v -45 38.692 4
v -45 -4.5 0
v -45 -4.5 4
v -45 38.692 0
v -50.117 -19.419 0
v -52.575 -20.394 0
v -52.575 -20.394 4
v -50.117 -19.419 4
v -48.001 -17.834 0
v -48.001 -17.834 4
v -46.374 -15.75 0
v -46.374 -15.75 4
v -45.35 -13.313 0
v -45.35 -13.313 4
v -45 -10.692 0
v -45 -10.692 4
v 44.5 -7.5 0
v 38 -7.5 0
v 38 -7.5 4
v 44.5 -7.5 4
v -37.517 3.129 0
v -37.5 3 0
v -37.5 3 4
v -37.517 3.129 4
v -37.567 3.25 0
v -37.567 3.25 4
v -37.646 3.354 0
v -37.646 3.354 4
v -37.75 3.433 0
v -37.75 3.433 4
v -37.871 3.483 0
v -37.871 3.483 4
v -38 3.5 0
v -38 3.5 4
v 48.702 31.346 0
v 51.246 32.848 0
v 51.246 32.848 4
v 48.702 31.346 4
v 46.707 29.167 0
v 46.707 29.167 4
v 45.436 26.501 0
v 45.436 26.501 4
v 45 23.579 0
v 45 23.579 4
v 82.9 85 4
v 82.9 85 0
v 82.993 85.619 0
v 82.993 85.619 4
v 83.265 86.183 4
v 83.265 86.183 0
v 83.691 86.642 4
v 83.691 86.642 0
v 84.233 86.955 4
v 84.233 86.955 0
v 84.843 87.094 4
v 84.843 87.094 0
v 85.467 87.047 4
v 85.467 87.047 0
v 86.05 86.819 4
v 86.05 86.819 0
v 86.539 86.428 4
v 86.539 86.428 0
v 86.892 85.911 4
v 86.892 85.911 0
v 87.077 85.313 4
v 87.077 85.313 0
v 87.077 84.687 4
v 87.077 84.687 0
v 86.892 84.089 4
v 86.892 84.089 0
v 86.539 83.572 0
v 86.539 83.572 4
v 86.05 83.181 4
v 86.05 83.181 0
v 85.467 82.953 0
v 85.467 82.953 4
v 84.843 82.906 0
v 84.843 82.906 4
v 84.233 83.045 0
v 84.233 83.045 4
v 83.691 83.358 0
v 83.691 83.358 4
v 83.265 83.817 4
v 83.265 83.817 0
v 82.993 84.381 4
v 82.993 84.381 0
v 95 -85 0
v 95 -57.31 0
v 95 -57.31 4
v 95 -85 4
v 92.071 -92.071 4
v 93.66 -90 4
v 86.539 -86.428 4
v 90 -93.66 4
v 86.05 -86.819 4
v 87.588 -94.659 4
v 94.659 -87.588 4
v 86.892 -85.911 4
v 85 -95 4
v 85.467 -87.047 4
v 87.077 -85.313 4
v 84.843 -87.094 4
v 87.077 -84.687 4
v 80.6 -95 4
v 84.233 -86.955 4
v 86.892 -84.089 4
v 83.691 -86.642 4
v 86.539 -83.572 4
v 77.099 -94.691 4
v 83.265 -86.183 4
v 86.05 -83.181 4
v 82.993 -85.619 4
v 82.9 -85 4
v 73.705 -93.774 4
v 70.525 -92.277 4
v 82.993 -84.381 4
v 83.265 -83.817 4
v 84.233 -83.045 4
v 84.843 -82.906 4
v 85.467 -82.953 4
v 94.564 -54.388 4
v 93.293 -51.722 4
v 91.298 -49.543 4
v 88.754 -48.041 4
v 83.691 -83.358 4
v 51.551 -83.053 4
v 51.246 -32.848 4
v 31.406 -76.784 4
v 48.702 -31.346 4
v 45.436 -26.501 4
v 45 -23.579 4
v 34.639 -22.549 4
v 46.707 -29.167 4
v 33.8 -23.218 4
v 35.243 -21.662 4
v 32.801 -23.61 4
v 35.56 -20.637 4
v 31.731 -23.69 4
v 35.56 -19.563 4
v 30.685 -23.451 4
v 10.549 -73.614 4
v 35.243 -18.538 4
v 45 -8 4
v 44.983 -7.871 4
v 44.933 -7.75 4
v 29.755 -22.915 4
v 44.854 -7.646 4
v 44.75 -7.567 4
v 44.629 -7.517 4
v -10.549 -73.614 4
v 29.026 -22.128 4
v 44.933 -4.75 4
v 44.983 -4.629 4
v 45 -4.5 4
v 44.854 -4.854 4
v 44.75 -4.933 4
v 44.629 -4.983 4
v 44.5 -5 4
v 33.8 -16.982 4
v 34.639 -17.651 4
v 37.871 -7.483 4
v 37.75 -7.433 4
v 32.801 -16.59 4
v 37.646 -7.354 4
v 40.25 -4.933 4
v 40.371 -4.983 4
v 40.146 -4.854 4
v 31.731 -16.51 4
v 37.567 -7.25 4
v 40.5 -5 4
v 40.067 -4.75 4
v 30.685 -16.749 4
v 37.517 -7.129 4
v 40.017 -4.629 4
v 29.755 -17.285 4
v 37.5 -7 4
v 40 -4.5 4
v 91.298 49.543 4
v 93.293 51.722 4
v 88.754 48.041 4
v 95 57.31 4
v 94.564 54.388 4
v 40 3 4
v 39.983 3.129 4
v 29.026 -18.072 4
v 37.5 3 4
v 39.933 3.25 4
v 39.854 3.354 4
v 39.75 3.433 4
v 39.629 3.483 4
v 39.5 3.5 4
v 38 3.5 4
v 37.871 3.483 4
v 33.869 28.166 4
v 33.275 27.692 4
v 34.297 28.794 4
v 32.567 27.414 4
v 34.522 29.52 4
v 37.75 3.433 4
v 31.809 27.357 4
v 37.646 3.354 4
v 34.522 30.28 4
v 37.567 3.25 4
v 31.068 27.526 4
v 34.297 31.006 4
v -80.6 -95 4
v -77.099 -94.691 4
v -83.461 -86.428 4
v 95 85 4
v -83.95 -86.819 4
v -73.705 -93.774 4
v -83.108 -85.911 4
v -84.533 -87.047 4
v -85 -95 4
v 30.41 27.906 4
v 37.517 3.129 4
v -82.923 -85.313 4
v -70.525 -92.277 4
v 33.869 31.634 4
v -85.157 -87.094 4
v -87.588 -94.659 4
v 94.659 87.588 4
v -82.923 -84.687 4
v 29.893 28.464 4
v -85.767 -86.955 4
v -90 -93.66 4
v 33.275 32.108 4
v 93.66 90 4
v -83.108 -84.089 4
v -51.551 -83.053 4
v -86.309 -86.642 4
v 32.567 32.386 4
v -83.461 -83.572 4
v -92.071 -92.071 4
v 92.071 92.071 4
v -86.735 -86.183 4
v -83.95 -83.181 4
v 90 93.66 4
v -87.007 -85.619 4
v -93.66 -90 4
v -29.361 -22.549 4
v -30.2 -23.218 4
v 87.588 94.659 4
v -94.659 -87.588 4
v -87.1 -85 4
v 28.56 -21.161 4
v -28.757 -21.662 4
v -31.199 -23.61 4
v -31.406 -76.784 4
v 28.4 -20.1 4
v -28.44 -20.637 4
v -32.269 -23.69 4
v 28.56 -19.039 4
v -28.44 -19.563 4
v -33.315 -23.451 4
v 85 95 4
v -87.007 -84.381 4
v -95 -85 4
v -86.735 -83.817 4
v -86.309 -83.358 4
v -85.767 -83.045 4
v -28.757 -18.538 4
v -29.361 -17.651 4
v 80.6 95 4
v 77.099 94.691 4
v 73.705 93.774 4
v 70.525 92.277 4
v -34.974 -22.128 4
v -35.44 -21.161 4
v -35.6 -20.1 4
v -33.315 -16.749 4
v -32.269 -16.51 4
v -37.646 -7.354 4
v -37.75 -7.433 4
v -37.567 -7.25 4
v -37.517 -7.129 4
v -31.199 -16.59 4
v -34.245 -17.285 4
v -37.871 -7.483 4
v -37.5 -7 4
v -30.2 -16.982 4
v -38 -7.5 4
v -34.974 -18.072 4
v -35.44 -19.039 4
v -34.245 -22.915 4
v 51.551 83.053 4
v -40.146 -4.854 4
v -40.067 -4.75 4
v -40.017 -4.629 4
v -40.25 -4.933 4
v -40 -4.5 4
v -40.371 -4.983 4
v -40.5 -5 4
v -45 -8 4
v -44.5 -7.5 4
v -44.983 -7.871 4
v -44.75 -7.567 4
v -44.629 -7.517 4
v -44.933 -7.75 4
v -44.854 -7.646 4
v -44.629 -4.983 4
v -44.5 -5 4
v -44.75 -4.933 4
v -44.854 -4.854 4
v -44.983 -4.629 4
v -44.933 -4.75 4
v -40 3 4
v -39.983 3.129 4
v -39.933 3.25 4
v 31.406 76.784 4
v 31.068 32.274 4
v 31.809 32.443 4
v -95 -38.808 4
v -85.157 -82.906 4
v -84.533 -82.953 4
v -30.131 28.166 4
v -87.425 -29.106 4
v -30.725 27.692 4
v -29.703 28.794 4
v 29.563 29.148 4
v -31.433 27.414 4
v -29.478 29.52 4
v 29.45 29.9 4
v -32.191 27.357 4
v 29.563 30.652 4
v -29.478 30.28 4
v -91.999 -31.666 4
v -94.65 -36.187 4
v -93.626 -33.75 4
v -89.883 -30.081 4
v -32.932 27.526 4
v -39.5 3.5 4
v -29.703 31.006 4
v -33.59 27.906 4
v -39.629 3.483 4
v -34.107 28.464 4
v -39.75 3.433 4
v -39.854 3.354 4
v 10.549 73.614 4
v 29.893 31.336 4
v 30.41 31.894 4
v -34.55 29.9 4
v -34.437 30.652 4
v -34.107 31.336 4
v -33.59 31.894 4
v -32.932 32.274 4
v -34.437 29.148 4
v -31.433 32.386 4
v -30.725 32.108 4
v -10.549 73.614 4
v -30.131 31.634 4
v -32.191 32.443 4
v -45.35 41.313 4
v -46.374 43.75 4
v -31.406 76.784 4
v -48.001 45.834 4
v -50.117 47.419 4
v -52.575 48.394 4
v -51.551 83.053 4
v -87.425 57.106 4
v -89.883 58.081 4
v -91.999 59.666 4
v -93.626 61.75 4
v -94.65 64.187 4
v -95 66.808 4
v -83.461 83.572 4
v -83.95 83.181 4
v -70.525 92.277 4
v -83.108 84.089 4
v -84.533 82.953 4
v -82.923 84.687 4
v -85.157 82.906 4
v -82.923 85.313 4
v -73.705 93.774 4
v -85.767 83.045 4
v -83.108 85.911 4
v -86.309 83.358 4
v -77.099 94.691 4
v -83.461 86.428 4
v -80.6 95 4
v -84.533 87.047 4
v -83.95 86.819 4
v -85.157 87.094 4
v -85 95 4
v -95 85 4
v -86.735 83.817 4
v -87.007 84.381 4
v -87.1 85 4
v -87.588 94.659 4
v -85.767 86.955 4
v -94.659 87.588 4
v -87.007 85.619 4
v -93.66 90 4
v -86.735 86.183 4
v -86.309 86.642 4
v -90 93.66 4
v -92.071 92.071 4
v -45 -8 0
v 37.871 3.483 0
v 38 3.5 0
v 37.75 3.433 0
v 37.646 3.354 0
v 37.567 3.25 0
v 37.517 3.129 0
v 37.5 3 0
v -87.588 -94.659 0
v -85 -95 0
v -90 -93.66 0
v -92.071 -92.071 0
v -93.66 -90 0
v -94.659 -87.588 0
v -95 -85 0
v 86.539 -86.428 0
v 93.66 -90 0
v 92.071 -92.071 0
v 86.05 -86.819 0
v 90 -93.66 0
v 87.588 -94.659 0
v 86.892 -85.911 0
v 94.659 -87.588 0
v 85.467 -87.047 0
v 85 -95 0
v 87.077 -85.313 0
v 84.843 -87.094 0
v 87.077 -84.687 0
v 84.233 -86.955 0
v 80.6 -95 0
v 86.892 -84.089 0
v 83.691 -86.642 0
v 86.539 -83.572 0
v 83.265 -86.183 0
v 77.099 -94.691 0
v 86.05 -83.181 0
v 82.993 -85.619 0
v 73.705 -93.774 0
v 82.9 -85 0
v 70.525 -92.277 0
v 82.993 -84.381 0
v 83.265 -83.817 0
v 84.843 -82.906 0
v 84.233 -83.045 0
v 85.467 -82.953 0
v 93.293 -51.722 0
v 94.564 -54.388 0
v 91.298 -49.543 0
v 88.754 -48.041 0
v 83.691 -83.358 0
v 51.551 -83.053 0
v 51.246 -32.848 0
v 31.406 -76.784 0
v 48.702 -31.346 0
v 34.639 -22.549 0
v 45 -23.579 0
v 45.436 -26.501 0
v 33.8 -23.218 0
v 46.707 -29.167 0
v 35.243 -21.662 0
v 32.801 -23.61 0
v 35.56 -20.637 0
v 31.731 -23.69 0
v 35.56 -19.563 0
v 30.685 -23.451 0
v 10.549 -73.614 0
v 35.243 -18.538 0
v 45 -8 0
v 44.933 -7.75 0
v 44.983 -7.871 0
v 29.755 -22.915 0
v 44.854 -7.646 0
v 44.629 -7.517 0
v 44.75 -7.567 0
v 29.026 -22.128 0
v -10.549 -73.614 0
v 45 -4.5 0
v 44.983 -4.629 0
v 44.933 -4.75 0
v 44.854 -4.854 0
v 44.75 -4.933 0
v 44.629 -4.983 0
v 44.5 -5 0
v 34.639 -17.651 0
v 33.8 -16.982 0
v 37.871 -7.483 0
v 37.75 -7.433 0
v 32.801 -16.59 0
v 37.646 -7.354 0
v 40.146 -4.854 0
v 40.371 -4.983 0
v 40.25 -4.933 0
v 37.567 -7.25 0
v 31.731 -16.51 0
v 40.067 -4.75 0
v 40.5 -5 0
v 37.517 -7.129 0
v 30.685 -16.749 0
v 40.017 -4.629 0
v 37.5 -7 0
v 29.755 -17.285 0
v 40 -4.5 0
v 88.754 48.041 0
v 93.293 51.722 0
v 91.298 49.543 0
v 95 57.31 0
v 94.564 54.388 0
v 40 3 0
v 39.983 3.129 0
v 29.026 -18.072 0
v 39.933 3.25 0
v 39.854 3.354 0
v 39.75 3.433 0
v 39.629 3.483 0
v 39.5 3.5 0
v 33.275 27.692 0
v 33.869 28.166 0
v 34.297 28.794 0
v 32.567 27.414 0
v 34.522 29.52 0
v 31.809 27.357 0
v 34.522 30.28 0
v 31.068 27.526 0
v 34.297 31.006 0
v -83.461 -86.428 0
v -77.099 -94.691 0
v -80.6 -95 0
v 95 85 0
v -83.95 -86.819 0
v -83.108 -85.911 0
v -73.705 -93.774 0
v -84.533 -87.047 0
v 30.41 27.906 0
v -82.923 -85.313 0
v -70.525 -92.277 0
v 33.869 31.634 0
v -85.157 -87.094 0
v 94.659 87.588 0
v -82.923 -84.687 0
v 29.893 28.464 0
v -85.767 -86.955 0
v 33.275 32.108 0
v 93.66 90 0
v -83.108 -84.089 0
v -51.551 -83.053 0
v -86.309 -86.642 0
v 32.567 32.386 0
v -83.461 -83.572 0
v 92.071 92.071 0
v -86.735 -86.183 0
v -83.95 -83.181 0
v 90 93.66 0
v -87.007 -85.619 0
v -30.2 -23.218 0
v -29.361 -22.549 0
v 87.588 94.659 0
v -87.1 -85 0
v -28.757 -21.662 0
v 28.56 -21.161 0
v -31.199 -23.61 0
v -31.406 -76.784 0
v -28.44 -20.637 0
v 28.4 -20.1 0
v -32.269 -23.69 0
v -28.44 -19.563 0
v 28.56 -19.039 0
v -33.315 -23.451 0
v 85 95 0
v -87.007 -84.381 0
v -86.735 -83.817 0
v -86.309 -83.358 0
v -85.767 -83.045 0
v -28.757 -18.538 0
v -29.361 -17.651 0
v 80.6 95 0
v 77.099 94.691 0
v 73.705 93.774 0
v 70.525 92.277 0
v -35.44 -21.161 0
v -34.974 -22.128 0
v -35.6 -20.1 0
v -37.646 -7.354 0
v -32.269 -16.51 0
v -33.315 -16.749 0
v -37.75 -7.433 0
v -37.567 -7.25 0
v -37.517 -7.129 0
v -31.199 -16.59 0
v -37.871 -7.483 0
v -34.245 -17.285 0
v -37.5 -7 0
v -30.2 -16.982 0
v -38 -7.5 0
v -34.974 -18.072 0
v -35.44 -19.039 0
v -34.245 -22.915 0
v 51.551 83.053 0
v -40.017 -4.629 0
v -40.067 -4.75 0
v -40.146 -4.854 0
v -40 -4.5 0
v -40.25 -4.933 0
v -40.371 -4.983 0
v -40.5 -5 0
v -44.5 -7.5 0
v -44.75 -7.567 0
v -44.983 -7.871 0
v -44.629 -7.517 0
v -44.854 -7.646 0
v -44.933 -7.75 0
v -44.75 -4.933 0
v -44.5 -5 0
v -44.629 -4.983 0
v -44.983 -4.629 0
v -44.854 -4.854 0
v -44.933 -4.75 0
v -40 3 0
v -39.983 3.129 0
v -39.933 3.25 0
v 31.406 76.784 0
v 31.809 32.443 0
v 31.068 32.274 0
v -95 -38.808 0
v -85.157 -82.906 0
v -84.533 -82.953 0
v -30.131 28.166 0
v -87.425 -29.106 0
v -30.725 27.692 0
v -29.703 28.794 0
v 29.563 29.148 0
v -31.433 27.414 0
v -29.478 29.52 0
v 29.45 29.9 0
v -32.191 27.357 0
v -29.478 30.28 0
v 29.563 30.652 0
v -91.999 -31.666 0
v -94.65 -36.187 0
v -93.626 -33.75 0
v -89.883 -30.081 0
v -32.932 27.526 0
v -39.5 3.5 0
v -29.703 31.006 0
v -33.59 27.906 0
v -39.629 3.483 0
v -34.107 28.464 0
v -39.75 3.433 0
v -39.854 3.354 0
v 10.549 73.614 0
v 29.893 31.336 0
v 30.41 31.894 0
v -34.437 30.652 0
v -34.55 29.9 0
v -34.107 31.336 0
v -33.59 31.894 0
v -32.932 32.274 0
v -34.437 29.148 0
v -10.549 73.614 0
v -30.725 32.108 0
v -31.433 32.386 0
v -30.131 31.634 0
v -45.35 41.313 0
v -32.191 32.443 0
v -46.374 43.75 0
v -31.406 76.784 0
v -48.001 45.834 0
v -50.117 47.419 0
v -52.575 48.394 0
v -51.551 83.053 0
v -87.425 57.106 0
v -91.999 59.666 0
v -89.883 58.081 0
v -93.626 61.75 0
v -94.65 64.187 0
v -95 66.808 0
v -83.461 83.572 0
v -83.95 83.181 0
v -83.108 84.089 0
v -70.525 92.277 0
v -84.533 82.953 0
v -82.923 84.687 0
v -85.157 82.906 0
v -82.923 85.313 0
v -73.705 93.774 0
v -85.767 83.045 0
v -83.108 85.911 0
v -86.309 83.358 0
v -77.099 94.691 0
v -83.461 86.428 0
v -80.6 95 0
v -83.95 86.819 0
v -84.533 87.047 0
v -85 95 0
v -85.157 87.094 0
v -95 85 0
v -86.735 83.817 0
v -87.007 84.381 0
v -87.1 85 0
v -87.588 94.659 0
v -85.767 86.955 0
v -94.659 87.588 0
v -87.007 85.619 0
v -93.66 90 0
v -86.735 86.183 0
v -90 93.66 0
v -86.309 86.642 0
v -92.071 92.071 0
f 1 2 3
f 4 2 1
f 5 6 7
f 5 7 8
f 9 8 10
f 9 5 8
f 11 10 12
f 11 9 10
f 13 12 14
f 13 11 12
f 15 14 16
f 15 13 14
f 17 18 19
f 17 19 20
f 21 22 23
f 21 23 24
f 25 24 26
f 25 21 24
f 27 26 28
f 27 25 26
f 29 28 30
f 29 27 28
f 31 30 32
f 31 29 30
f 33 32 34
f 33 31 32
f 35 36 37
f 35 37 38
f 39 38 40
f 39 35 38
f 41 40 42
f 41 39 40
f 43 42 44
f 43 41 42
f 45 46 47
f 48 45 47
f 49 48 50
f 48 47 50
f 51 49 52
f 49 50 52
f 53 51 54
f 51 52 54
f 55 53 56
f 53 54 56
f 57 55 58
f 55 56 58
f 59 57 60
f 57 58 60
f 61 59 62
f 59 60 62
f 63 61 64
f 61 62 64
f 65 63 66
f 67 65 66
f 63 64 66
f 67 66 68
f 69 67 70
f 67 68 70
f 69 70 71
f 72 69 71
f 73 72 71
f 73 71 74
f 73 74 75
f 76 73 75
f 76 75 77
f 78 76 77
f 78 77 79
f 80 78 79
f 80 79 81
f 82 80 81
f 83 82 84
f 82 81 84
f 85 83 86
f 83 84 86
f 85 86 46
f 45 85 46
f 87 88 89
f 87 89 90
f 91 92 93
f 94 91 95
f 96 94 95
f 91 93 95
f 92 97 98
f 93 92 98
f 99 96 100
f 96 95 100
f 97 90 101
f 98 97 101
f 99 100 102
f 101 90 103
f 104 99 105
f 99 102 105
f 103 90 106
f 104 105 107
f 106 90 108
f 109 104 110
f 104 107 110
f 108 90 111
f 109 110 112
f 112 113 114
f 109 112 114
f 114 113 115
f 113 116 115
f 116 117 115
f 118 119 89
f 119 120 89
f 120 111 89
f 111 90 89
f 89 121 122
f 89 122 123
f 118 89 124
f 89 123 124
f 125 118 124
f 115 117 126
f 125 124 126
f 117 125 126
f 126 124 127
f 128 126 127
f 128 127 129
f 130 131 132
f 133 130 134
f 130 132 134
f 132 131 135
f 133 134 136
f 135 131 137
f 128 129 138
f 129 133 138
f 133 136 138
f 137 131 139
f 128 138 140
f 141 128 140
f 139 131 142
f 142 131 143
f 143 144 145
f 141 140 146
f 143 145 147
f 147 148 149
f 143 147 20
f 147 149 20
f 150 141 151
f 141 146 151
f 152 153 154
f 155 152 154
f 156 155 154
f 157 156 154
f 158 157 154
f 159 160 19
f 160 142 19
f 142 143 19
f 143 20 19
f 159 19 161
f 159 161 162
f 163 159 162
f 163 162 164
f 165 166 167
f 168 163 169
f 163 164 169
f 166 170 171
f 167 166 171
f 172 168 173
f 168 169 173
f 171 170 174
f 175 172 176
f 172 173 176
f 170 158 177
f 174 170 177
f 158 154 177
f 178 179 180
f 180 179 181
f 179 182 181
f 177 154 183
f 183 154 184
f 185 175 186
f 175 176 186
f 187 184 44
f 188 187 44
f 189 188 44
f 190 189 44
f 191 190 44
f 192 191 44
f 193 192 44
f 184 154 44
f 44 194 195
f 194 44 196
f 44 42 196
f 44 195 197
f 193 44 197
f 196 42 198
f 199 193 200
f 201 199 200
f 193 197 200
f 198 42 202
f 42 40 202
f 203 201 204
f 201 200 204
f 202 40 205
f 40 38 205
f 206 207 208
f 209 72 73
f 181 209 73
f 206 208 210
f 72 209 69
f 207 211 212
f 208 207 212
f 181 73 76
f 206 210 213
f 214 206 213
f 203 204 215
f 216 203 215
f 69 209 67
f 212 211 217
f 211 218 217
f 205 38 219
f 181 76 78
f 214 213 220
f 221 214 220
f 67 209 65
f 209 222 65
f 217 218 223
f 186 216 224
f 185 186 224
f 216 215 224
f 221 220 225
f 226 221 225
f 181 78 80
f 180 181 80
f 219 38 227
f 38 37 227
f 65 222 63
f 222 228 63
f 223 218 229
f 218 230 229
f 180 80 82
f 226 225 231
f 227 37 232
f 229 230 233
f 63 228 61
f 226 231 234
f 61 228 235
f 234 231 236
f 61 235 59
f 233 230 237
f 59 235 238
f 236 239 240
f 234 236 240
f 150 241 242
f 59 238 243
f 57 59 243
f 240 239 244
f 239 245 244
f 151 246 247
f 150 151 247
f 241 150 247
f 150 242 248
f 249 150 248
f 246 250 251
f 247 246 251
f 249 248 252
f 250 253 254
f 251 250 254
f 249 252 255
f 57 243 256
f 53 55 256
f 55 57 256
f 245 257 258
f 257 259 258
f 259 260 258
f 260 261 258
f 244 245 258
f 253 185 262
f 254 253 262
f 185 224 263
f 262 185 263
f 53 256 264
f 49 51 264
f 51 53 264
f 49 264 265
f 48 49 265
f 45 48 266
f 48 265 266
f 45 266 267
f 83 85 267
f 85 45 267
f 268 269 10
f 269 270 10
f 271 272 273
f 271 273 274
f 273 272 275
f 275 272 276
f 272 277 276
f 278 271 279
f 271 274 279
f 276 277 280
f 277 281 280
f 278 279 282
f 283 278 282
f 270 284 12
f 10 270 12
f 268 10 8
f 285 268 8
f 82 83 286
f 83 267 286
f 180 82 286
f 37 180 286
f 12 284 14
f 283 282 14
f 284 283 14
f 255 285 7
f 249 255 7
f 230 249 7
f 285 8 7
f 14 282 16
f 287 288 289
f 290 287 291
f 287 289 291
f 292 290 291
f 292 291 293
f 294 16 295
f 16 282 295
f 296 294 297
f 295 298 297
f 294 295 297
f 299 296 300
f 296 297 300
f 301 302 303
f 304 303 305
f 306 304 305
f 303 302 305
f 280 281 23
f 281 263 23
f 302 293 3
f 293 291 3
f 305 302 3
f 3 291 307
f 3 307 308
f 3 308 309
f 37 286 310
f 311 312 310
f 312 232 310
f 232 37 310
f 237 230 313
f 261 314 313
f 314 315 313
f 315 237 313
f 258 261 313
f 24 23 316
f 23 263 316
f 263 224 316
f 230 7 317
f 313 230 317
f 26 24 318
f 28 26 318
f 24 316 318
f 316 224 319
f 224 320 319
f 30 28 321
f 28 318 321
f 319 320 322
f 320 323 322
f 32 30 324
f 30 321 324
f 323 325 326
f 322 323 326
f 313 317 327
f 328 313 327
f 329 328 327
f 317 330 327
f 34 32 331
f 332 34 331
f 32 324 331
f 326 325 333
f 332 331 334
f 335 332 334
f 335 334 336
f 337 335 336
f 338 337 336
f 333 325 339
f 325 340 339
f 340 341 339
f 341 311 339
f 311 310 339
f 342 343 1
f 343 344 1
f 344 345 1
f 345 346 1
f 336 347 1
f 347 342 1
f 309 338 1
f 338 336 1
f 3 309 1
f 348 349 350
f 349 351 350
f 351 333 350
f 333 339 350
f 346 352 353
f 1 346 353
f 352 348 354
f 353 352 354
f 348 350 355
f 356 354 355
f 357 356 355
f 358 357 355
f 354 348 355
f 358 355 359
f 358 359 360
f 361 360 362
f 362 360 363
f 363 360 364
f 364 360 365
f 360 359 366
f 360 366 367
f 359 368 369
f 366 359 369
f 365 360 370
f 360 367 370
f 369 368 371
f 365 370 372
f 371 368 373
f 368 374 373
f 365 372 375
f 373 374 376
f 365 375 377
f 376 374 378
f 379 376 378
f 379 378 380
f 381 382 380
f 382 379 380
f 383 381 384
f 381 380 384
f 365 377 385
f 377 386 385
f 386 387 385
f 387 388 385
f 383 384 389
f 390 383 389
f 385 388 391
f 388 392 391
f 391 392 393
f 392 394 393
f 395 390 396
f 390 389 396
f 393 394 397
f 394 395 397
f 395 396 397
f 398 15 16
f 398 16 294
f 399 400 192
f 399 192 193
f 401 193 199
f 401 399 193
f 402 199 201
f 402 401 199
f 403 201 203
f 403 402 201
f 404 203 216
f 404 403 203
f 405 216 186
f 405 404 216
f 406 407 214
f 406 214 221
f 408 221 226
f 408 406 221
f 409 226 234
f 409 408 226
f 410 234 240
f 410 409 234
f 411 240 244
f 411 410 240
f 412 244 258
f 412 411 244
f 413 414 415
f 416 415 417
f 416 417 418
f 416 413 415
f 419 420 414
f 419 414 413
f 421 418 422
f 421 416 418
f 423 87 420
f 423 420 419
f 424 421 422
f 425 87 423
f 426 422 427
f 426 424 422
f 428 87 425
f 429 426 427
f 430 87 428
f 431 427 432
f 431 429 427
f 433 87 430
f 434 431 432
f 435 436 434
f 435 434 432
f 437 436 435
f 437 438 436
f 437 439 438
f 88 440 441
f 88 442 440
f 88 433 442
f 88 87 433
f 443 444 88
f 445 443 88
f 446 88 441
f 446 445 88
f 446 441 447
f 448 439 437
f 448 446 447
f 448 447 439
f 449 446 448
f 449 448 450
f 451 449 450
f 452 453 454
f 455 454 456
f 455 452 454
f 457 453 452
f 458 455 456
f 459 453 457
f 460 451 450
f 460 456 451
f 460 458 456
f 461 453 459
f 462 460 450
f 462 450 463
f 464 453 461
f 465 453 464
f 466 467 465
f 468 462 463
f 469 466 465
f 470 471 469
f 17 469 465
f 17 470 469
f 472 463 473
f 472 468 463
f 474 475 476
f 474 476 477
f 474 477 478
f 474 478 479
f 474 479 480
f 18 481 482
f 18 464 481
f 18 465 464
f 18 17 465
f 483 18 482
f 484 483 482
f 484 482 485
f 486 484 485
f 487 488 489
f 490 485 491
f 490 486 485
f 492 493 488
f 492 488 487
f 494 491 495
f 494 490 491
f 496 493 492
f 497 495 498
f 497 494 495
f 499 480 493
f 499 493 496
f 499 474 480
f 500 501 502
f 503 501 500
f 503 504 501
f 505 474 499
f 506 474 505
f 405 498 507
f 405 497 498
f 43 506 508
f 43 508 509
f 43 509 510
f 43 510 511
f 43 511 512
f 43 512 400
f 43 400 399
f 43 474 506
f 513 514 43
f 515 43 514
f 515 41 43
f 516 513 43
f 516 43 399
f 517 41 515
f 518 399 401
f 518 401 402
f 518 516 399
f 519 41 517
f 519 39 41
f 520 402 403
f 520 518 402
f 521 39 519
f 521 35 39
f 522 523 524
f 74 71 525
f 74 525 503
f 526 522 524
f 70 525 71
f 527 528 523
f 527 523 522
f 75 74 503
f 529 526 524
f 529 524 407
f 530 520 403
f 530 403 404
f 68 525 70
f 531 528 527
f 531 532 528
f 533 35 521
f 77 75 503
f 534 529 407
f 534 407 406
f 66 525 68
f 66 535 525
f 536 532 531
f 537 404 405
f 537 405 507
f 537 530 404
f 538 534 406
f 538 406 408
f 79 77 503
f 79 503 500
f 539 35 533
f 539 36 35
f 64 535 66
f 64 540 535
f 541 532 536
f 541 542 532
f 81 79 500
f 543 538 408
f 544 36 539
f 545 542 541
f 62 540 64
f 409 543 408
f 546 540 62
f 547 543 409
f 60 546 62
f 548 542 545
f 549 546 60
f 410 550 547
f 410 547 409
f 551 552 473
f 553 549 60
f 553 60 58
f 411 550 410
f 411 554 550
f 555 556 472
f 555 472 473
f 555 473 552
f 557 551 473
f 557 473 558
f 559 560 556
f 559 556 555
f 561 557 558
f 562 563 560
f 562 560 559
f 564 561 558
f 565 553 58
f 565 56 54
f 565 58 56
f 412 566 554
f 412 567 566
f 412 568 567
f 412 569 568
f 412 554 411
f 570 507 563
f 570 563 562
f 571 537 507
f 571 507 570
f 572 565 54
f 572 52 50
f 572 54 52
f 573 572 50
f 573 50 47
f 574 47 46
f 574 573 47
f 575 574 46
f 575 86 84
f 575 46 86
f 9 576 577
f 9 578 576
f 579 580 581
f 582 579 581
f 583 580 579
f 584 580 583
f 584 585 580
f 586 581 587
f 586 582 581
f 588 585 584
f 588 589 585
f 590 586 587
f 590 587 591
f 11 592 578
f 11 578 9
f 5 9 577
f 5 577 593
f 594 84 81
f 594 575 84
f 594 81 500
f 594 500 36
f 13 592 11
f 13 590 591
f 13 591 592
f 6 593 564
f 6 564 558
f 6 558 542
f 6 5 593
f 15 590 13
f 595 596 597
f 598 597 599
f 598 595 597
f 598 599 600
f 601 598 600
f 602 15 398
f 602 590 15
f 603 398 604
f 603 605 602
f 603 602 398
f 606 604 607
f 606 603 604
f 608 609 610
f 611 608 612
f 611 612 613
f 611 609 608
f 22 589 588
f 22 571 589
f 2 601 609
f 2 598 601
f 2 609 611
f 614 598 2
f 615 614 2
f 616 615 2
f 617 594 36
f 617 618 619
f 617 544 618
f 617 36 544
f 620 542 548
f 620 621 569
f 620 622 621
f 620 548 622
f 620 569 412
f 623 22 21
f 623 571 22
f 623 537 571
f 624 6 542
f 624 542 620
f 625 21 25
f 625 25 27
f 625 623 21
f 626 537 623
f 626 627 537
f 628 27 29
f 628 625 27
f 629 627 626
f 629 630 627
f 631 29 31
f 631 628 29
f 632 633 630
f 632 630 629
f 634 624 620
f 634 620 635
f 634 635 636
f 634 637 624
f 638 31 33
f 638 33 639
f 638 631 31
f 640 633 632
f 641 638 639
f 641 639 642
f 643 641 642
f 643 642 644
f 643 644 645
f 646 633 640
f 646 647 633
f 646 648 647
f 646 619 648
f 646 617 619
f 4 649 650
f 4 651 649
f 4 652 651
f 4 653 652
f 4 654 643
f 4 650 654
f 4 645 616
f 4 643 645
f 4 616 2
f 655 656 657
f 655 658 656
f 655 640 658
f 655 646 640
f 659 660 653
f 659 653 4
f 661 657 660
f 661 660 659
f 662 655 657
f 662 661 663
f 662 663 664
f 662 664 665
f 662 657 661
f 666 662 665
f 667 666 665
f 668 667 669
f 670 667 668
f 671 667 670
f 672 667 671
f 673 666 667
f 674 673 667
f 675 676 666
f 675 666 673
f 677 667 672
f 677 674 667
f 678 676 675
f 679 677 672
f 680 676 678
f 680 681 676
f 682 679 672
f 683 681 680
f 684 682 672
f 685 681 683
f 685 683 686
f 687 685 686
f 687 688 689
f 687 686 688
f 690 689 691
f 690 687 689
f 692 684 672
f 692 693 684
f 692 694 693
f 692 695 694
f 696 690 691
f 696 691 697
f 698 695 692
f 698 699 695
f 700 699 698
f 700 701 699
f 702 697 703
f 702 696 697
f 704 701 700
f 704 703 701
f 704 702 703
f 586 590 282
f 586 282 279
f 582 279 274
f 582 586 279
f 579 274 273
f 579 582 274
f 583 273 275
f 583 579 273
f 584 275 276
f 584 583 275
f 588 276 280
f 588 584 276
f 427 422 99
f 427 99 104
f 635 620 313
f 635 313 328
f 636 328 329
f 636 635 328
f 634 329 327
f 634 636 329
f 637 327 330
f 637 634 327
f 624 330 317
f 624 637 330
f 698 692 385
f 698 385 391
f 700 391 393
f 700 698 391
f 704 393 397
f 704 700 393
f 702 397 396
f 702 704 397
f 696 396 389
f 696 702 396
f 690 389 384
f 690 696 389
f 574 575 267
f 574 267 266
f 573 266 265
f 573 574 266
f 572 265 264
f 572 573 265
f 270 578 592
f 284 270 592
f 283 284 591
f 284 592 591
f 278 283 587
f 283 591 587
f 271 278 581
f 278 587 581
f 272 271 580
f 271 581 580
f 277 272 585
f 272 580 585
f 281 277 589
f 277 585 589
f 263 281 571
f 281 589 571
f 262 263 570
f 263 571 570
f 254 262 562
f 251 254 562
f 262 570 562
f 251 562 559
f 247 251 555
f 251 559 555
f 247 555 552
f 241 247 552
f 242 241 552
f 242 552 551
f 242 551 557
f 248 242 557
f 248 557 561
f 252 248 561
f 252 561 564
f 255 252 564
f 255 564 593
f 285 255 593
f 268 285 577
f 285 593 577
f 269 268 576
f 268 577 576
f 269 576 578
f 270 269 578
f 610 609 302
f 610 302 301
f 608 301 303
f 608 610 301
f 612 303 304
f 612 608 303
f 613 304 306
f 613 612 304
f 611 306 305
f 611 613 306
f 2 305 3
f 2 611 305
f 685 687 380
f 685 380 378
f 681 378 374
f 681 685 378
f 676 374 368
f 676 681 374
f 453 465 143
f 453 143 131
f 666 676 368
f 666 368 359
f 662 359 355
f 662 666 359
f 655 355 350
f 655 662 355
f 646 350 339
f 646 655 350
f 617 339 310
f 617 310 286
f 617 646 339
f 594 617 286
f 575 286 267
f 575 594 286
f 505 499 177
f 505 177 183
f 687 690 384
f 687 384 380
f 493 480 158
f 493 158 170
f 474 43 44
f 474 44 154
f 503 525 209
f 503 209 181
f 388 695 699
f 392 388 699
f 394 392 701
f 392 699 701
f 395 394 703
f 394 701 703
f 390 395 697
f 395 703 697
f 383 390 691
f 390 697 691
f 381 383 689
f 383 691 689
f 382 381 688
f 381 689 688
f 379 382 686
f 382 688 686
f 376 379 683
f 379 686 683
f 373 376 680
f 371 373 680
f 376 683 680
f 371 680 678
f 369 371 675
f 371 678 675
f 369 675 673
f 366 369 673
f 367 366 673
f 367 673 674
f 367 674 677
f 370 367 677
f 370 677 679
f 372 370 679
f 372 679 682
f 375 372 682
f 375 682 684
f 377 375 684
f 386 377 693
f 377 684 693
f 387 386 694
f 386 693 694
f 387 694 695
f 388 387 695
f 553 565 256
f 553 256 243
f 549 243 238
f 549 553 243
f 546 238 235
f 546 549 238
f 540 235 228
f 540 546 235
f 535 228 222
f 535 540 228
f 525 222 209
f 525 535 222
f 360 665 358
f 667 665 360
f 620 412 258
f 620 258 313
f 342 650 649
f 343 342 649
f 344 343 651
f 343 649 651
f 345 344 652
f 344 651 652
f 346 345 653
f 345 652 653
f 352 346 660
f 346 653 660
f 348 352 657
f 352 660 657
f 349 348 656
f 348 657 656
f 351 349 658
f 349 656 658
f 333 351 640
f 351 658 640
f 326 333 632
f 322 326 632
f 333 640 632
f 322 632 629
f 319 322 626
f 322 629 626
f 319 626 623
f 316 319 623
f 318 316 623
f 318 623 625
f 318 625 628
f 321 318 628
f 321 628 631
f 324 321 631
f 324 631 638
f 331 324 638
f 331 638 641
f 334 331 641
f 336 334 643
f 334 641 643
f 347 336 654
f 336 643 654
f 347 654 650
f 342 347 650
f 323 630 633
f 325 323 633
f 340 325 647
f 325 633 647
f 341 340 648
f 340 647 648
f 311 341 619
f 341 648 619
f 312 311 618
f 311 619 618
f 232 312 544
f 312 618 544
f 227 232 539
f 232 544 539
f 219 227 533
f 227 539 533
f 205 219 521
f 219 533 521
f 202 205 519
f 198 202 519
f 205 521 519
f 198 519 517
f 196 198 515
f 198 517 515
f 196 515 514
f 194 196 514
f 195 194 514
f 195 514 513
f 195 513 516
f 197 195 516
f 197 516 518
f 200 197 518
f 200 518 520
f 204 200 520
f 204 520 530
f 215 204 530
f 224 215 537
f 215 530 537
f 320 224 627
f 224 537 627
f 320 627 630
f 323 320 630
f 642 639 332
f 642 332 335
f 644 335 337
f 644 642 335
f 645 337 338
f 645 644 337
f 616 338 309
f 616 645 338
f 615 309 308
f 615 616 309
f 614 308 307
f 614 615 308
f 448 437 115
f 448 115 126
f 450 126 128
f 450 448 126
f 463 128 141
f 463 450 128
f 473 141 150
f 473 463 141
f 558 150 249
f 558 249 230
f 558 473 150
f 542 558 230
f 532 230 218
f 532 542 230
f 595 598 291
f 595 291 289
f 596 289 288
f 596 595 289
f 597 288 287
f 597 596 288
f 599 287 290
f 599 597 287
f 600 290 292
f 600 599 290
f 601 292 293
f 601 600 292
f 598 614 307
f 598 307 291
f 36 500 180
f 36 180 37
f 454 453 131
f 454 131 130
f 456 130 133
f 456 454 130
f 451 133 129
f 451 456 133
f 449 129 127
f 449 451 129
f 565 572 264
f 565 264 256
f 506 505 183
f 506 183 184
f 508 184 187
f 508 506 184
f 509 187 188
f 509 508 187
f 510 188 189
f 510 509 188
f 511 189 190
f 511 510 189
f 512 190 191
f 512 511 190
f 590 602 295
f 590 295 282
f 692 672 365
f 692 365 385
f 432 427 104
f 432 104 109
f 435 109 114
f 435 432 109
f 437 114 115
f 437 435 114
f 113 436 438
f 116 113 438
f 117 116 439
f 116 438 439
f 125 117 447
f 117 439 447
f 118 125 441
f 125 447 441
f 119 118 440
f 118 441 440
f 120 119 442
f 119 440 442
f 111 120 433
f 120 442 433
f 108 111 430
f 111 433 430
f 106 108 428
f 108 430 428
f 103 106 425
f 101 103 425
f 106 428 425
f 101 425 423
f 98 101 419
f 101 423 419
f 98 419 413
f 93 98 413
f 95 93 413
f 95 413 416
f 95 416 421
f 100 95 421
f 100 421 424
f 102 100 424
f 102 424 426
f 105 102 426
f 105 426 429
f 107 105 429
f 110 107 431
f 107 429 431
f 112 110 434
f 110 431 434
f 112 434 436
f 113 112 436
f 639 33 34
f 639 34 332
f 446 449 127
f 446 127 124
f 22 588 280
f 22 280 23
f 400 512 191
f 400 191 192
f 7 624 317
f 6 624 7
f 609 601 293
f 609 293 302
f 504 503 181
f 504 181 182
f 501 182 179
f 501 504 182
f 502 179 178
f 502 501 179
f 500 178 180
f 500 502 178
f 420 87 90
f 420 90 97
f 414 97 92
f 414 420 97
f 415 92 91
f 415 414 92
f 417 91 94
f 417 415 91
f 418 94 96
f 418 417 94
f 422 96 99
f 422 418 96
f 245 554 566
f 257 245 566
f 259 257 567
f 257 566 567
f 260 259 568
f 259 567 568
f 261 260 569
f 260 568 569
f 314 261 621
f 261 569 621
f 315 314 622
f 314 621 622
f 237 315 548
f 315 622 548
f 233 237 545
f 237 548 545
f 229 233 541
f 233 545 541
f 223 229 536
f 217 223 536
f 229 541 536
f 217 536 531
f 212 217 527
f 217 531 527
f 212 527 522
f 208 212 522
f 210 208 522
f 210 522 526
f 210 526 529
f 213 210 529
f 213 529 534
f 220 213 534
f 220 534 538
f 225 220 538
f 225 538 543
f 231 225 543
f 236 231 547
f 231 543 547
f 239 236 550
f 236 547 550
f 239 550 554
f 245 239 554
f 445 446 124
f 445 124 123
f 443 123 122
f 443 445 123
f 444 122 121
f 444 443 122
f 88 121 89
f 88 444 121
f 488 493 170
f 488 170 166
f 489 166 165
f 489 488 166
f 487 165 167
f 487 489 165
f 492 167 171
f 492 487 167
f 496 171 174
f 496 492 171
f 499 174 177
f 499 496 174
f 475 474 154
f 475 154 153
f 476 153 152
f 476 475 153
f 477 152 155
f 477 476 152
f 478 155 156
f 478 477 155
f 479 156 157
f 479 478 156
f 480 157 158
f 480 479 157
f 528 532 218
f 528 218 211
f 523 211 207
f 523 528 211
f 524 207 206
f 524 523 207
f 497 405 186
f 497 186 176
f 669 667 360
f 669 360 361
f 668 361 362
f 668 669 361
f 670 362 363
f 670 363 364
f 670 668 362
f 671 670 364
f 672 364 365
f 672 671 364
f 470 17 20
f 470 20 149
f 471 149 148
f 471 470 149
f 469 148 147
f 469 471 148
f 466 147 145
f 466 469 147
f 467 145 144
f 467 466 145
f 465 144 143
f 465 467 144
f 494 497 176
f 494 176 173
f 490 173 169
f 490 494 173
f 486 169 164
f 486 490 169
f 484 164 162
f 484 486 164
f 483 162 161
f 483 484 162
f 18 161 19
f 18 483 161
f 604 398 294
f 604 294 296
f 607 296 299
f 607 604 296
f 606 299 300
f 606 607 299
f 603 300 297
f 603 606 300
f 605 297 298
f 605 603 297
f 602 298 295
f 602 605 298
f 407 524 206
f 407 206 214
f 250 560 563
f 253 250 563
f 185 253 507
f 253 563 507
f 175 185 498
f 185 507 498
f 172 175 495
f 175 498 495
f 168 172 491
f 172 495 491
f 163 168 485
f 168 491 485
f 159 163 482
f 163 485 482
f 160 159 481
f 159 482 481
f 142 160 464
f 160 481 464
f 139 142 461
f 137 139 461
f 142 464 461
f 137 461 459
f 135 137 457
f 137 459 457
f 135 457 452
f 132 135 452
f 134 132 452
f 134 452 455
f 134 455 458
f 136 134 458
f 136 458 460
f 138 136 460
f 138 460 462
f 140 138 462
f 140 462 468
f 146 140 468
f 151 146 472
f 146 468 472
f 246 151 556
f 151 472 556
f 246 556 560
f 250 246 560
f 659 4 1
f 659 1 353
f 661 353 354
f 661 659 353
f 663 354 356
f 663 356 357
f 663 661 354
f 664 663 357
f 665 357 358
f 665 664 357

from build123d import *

# Parameters (mm, degrees)
SKETCH1_R           = 2.1
SKETCH1_R_2         = 2.55
SKETCH1_R_3         = 3.6
BOSS_EXTRUDE1_DEPTH = 4


with BuildPart() as part:
    # Sketch1 → Boss-Extrude1 (new body)
    with BuildSketch(Plane(origin=(0, 0, 0), x_dir=(-1, 0, 0), z_dir=(0, 0, -1))):
        with BuildLine():
            Line((87.42535625, -29.106339063), (52.57464375, -20.393660937))
            ThreePointArc((52.57464375, -20.393660937), (47.11794562, -16.84635803), (45, -10.692235936))
            Line((45, -10.692235936), (45, -8))
            ThreePointArc((45, -8), (44.853553391, -7.646446609), (44.5, -7.5))
            Line((44.5, -7.5), (38, -7.5))
            ThreePointArc((38, -7.5), (37.646446609, -7.353553391), (37.5, -7))
            Line((37.5, -7), (37.5, 3))
            ThreePointArc((37.5, 3), (37.646446609, 3.353553391), (38, 3.5))
            Line((38, 3.5), (39.5, 3.5))
            ThreePointArc((39.5, 3.5), (39.853553391, 3.353553391), (40, 3))
            Line((40, 3), (40, -4.5))
            ThreePointArc((40, -4.5), (40.146446609, -4.853553391), (40.5, -5))
            Line((40.5, -5), (44.5, -5))
            ThreePointArc((44.5, -5), (44.853553391, -4.853553391), (45, -4.5))
            Line((45, -4.5), (45, 38.692235936))
            ThreePointArc((45, 38.692235936), (47.11794562, 44.84635803), (52.57464375, 48.393660937))
            Line((52.57464375, 48.393660937), (87.42535625, 57.106339063))
            ThreePointArc((87.42535625, 57.106339063), (92.88205438, 60.65364197), (95, 66.807764064))
            Line((95, 66.807764064), (95, 85))
            ThreePointArc((95, 85), (92.071067812, 92.071067812), (85, 95))
            Line((85, 95), (80.600023778, 95))
            ThreePointArc((80.600023778, 95), (75.38177505, 94.307249421), (70.525020806, 92.276988022))
            ThreePointArc((70.525020806, 92.276988022), (0, 73.215904175), (-70.525020806, 92.276988022))
            ThreePointArc((-70.525020806, 92.276988022), (-75.38177505, 94.307249421), (-80.600023778, 95))
            Line((-80.600023778, 95), (-85, 95))
            ThreePointArc((-85, 95), (-92.071067812, 92.071067812), (-95, 85))
            Line((-95, 85), (-95, 57.30993956))
            ThreePointArc((-95, 57.30993956), (-93.292887614, 51.721736358), (-88.754396995, 48.041471336))
            Line((-88.754396995, 48.041471336), (-51.245603005, 32.847708996))
            ThreePointArc((-51.245603005, 32.847708996), (-46.707112386, 29.167443975), (-45, 23.579240773))
            Line((-45, 23.579240773), (-45, -4.5))
            ThreePointArc((-45, -4.5), (-44.853553391, -4.853553391), (-44.5, -5))
            Line((-44.5, -5), (-40.5, -5))
            ThreePointArc((-40.5, -5), (-40.146446609, -4.853553391), (-40, -4.5))
            Line((-40, -4.5), (-40, 3))
            ThreePointArc((-40, 3), (-39.853553391, 3.353553391), (-39.5, 3.5))
            Line((-39.5, 3.5), (-38, 3.5))
            ThreePointArc((-38, 3.5), (-37.646446609, 3.353553391), (-37.5, 3))
            Line((-37.5, 3), (-37.5, -7))
            ThreePointArc((-37.5, -7), (-37.646446609, -7.353553391), (-38, -7.5))
            Line((-38, -7.5), (-44.5, -7.5))
            ThreePointArc((-44.5, -7.5), (-44.853553391, -7.646446609), (-45, -8))
            Line((-45, -8), (-45, -23.579240773))
            ThreePointArc((-45, -23.579240773), (-46.707112386, -29.167443975), (-51.245603005, -32.847708996))
            Line((-51.245603005, -32.847708996), (-88.754396995, -48.041471336))
            ThreePointArc((-88.754396995, -48.041471336), (-93.292887614, -51.721736358), (-95, -57.30993956))
            Line((-95, -57.30993956), (-95, -85))
            ThreePointArc((-95, -85), (-92.071067812, -92.071067812), (-85, -95))
            Line((-85, -95), (-80.600023778, -95))
            ThreePointArc((-80.600023778, -95), (-75.38177505, -94.307249421), (-70.525020806, -92.276988022))
            ThreePointArc((-70.525020806, -92.276988022), (0, -73.215904175), (70.525020806, -92.276988022))
            ThreePointArc((70.525020806, -92.276988022), (75.38177505, -94.307249421), (80.600023778, -95))
            Line((80.600023778, -95), (85, -95))
            ThreePointArc((85, -95), (92.071067812, -92.071067812), (95, -85))
            Line((95, -85), (95, -38.807764064))
            ThreePointArc((95, -38.807764064), (92.88205438, -32.65364197), (87.42535625, -29.106339063))
        make_face()
        with Locations((-85, -85)):
            Circle(SKETCH1_R, mode=Mode.SUBTRACT)
        with Locations((-85, 85)):
            Circle(SKETCH1_R, mode=Mode.SUBTRACT)
        with Locations((85, 85)):
            Circle(SKETCH1_R, mode=Mode.SUBTRACT)
        with Locations((85, -85)):
            Circle(SKETCH1_R, mode=Mode.SUBTRACT)
        with Locations((32, 29.9)):
            Circle(SKETCH1_R_2, mode=Mode.SUBTRACT)
        with Locations((32, -20.1)):
            Circle(SKETCH1_R_3, mode=Mode.SUBTRACT)
        with Locations((-32, -20.1)):
            Circle(SKETCH1_R_3, mode=Mode.SUBTRACT)
        with Locations((-32, 29.9)):
            Circle(SKETCH1_R_2, mode=Mode.SUBTRACT)
    extrude(amount=-BOSS_EXTRUDE1_DEPTH)


solid = part.part
